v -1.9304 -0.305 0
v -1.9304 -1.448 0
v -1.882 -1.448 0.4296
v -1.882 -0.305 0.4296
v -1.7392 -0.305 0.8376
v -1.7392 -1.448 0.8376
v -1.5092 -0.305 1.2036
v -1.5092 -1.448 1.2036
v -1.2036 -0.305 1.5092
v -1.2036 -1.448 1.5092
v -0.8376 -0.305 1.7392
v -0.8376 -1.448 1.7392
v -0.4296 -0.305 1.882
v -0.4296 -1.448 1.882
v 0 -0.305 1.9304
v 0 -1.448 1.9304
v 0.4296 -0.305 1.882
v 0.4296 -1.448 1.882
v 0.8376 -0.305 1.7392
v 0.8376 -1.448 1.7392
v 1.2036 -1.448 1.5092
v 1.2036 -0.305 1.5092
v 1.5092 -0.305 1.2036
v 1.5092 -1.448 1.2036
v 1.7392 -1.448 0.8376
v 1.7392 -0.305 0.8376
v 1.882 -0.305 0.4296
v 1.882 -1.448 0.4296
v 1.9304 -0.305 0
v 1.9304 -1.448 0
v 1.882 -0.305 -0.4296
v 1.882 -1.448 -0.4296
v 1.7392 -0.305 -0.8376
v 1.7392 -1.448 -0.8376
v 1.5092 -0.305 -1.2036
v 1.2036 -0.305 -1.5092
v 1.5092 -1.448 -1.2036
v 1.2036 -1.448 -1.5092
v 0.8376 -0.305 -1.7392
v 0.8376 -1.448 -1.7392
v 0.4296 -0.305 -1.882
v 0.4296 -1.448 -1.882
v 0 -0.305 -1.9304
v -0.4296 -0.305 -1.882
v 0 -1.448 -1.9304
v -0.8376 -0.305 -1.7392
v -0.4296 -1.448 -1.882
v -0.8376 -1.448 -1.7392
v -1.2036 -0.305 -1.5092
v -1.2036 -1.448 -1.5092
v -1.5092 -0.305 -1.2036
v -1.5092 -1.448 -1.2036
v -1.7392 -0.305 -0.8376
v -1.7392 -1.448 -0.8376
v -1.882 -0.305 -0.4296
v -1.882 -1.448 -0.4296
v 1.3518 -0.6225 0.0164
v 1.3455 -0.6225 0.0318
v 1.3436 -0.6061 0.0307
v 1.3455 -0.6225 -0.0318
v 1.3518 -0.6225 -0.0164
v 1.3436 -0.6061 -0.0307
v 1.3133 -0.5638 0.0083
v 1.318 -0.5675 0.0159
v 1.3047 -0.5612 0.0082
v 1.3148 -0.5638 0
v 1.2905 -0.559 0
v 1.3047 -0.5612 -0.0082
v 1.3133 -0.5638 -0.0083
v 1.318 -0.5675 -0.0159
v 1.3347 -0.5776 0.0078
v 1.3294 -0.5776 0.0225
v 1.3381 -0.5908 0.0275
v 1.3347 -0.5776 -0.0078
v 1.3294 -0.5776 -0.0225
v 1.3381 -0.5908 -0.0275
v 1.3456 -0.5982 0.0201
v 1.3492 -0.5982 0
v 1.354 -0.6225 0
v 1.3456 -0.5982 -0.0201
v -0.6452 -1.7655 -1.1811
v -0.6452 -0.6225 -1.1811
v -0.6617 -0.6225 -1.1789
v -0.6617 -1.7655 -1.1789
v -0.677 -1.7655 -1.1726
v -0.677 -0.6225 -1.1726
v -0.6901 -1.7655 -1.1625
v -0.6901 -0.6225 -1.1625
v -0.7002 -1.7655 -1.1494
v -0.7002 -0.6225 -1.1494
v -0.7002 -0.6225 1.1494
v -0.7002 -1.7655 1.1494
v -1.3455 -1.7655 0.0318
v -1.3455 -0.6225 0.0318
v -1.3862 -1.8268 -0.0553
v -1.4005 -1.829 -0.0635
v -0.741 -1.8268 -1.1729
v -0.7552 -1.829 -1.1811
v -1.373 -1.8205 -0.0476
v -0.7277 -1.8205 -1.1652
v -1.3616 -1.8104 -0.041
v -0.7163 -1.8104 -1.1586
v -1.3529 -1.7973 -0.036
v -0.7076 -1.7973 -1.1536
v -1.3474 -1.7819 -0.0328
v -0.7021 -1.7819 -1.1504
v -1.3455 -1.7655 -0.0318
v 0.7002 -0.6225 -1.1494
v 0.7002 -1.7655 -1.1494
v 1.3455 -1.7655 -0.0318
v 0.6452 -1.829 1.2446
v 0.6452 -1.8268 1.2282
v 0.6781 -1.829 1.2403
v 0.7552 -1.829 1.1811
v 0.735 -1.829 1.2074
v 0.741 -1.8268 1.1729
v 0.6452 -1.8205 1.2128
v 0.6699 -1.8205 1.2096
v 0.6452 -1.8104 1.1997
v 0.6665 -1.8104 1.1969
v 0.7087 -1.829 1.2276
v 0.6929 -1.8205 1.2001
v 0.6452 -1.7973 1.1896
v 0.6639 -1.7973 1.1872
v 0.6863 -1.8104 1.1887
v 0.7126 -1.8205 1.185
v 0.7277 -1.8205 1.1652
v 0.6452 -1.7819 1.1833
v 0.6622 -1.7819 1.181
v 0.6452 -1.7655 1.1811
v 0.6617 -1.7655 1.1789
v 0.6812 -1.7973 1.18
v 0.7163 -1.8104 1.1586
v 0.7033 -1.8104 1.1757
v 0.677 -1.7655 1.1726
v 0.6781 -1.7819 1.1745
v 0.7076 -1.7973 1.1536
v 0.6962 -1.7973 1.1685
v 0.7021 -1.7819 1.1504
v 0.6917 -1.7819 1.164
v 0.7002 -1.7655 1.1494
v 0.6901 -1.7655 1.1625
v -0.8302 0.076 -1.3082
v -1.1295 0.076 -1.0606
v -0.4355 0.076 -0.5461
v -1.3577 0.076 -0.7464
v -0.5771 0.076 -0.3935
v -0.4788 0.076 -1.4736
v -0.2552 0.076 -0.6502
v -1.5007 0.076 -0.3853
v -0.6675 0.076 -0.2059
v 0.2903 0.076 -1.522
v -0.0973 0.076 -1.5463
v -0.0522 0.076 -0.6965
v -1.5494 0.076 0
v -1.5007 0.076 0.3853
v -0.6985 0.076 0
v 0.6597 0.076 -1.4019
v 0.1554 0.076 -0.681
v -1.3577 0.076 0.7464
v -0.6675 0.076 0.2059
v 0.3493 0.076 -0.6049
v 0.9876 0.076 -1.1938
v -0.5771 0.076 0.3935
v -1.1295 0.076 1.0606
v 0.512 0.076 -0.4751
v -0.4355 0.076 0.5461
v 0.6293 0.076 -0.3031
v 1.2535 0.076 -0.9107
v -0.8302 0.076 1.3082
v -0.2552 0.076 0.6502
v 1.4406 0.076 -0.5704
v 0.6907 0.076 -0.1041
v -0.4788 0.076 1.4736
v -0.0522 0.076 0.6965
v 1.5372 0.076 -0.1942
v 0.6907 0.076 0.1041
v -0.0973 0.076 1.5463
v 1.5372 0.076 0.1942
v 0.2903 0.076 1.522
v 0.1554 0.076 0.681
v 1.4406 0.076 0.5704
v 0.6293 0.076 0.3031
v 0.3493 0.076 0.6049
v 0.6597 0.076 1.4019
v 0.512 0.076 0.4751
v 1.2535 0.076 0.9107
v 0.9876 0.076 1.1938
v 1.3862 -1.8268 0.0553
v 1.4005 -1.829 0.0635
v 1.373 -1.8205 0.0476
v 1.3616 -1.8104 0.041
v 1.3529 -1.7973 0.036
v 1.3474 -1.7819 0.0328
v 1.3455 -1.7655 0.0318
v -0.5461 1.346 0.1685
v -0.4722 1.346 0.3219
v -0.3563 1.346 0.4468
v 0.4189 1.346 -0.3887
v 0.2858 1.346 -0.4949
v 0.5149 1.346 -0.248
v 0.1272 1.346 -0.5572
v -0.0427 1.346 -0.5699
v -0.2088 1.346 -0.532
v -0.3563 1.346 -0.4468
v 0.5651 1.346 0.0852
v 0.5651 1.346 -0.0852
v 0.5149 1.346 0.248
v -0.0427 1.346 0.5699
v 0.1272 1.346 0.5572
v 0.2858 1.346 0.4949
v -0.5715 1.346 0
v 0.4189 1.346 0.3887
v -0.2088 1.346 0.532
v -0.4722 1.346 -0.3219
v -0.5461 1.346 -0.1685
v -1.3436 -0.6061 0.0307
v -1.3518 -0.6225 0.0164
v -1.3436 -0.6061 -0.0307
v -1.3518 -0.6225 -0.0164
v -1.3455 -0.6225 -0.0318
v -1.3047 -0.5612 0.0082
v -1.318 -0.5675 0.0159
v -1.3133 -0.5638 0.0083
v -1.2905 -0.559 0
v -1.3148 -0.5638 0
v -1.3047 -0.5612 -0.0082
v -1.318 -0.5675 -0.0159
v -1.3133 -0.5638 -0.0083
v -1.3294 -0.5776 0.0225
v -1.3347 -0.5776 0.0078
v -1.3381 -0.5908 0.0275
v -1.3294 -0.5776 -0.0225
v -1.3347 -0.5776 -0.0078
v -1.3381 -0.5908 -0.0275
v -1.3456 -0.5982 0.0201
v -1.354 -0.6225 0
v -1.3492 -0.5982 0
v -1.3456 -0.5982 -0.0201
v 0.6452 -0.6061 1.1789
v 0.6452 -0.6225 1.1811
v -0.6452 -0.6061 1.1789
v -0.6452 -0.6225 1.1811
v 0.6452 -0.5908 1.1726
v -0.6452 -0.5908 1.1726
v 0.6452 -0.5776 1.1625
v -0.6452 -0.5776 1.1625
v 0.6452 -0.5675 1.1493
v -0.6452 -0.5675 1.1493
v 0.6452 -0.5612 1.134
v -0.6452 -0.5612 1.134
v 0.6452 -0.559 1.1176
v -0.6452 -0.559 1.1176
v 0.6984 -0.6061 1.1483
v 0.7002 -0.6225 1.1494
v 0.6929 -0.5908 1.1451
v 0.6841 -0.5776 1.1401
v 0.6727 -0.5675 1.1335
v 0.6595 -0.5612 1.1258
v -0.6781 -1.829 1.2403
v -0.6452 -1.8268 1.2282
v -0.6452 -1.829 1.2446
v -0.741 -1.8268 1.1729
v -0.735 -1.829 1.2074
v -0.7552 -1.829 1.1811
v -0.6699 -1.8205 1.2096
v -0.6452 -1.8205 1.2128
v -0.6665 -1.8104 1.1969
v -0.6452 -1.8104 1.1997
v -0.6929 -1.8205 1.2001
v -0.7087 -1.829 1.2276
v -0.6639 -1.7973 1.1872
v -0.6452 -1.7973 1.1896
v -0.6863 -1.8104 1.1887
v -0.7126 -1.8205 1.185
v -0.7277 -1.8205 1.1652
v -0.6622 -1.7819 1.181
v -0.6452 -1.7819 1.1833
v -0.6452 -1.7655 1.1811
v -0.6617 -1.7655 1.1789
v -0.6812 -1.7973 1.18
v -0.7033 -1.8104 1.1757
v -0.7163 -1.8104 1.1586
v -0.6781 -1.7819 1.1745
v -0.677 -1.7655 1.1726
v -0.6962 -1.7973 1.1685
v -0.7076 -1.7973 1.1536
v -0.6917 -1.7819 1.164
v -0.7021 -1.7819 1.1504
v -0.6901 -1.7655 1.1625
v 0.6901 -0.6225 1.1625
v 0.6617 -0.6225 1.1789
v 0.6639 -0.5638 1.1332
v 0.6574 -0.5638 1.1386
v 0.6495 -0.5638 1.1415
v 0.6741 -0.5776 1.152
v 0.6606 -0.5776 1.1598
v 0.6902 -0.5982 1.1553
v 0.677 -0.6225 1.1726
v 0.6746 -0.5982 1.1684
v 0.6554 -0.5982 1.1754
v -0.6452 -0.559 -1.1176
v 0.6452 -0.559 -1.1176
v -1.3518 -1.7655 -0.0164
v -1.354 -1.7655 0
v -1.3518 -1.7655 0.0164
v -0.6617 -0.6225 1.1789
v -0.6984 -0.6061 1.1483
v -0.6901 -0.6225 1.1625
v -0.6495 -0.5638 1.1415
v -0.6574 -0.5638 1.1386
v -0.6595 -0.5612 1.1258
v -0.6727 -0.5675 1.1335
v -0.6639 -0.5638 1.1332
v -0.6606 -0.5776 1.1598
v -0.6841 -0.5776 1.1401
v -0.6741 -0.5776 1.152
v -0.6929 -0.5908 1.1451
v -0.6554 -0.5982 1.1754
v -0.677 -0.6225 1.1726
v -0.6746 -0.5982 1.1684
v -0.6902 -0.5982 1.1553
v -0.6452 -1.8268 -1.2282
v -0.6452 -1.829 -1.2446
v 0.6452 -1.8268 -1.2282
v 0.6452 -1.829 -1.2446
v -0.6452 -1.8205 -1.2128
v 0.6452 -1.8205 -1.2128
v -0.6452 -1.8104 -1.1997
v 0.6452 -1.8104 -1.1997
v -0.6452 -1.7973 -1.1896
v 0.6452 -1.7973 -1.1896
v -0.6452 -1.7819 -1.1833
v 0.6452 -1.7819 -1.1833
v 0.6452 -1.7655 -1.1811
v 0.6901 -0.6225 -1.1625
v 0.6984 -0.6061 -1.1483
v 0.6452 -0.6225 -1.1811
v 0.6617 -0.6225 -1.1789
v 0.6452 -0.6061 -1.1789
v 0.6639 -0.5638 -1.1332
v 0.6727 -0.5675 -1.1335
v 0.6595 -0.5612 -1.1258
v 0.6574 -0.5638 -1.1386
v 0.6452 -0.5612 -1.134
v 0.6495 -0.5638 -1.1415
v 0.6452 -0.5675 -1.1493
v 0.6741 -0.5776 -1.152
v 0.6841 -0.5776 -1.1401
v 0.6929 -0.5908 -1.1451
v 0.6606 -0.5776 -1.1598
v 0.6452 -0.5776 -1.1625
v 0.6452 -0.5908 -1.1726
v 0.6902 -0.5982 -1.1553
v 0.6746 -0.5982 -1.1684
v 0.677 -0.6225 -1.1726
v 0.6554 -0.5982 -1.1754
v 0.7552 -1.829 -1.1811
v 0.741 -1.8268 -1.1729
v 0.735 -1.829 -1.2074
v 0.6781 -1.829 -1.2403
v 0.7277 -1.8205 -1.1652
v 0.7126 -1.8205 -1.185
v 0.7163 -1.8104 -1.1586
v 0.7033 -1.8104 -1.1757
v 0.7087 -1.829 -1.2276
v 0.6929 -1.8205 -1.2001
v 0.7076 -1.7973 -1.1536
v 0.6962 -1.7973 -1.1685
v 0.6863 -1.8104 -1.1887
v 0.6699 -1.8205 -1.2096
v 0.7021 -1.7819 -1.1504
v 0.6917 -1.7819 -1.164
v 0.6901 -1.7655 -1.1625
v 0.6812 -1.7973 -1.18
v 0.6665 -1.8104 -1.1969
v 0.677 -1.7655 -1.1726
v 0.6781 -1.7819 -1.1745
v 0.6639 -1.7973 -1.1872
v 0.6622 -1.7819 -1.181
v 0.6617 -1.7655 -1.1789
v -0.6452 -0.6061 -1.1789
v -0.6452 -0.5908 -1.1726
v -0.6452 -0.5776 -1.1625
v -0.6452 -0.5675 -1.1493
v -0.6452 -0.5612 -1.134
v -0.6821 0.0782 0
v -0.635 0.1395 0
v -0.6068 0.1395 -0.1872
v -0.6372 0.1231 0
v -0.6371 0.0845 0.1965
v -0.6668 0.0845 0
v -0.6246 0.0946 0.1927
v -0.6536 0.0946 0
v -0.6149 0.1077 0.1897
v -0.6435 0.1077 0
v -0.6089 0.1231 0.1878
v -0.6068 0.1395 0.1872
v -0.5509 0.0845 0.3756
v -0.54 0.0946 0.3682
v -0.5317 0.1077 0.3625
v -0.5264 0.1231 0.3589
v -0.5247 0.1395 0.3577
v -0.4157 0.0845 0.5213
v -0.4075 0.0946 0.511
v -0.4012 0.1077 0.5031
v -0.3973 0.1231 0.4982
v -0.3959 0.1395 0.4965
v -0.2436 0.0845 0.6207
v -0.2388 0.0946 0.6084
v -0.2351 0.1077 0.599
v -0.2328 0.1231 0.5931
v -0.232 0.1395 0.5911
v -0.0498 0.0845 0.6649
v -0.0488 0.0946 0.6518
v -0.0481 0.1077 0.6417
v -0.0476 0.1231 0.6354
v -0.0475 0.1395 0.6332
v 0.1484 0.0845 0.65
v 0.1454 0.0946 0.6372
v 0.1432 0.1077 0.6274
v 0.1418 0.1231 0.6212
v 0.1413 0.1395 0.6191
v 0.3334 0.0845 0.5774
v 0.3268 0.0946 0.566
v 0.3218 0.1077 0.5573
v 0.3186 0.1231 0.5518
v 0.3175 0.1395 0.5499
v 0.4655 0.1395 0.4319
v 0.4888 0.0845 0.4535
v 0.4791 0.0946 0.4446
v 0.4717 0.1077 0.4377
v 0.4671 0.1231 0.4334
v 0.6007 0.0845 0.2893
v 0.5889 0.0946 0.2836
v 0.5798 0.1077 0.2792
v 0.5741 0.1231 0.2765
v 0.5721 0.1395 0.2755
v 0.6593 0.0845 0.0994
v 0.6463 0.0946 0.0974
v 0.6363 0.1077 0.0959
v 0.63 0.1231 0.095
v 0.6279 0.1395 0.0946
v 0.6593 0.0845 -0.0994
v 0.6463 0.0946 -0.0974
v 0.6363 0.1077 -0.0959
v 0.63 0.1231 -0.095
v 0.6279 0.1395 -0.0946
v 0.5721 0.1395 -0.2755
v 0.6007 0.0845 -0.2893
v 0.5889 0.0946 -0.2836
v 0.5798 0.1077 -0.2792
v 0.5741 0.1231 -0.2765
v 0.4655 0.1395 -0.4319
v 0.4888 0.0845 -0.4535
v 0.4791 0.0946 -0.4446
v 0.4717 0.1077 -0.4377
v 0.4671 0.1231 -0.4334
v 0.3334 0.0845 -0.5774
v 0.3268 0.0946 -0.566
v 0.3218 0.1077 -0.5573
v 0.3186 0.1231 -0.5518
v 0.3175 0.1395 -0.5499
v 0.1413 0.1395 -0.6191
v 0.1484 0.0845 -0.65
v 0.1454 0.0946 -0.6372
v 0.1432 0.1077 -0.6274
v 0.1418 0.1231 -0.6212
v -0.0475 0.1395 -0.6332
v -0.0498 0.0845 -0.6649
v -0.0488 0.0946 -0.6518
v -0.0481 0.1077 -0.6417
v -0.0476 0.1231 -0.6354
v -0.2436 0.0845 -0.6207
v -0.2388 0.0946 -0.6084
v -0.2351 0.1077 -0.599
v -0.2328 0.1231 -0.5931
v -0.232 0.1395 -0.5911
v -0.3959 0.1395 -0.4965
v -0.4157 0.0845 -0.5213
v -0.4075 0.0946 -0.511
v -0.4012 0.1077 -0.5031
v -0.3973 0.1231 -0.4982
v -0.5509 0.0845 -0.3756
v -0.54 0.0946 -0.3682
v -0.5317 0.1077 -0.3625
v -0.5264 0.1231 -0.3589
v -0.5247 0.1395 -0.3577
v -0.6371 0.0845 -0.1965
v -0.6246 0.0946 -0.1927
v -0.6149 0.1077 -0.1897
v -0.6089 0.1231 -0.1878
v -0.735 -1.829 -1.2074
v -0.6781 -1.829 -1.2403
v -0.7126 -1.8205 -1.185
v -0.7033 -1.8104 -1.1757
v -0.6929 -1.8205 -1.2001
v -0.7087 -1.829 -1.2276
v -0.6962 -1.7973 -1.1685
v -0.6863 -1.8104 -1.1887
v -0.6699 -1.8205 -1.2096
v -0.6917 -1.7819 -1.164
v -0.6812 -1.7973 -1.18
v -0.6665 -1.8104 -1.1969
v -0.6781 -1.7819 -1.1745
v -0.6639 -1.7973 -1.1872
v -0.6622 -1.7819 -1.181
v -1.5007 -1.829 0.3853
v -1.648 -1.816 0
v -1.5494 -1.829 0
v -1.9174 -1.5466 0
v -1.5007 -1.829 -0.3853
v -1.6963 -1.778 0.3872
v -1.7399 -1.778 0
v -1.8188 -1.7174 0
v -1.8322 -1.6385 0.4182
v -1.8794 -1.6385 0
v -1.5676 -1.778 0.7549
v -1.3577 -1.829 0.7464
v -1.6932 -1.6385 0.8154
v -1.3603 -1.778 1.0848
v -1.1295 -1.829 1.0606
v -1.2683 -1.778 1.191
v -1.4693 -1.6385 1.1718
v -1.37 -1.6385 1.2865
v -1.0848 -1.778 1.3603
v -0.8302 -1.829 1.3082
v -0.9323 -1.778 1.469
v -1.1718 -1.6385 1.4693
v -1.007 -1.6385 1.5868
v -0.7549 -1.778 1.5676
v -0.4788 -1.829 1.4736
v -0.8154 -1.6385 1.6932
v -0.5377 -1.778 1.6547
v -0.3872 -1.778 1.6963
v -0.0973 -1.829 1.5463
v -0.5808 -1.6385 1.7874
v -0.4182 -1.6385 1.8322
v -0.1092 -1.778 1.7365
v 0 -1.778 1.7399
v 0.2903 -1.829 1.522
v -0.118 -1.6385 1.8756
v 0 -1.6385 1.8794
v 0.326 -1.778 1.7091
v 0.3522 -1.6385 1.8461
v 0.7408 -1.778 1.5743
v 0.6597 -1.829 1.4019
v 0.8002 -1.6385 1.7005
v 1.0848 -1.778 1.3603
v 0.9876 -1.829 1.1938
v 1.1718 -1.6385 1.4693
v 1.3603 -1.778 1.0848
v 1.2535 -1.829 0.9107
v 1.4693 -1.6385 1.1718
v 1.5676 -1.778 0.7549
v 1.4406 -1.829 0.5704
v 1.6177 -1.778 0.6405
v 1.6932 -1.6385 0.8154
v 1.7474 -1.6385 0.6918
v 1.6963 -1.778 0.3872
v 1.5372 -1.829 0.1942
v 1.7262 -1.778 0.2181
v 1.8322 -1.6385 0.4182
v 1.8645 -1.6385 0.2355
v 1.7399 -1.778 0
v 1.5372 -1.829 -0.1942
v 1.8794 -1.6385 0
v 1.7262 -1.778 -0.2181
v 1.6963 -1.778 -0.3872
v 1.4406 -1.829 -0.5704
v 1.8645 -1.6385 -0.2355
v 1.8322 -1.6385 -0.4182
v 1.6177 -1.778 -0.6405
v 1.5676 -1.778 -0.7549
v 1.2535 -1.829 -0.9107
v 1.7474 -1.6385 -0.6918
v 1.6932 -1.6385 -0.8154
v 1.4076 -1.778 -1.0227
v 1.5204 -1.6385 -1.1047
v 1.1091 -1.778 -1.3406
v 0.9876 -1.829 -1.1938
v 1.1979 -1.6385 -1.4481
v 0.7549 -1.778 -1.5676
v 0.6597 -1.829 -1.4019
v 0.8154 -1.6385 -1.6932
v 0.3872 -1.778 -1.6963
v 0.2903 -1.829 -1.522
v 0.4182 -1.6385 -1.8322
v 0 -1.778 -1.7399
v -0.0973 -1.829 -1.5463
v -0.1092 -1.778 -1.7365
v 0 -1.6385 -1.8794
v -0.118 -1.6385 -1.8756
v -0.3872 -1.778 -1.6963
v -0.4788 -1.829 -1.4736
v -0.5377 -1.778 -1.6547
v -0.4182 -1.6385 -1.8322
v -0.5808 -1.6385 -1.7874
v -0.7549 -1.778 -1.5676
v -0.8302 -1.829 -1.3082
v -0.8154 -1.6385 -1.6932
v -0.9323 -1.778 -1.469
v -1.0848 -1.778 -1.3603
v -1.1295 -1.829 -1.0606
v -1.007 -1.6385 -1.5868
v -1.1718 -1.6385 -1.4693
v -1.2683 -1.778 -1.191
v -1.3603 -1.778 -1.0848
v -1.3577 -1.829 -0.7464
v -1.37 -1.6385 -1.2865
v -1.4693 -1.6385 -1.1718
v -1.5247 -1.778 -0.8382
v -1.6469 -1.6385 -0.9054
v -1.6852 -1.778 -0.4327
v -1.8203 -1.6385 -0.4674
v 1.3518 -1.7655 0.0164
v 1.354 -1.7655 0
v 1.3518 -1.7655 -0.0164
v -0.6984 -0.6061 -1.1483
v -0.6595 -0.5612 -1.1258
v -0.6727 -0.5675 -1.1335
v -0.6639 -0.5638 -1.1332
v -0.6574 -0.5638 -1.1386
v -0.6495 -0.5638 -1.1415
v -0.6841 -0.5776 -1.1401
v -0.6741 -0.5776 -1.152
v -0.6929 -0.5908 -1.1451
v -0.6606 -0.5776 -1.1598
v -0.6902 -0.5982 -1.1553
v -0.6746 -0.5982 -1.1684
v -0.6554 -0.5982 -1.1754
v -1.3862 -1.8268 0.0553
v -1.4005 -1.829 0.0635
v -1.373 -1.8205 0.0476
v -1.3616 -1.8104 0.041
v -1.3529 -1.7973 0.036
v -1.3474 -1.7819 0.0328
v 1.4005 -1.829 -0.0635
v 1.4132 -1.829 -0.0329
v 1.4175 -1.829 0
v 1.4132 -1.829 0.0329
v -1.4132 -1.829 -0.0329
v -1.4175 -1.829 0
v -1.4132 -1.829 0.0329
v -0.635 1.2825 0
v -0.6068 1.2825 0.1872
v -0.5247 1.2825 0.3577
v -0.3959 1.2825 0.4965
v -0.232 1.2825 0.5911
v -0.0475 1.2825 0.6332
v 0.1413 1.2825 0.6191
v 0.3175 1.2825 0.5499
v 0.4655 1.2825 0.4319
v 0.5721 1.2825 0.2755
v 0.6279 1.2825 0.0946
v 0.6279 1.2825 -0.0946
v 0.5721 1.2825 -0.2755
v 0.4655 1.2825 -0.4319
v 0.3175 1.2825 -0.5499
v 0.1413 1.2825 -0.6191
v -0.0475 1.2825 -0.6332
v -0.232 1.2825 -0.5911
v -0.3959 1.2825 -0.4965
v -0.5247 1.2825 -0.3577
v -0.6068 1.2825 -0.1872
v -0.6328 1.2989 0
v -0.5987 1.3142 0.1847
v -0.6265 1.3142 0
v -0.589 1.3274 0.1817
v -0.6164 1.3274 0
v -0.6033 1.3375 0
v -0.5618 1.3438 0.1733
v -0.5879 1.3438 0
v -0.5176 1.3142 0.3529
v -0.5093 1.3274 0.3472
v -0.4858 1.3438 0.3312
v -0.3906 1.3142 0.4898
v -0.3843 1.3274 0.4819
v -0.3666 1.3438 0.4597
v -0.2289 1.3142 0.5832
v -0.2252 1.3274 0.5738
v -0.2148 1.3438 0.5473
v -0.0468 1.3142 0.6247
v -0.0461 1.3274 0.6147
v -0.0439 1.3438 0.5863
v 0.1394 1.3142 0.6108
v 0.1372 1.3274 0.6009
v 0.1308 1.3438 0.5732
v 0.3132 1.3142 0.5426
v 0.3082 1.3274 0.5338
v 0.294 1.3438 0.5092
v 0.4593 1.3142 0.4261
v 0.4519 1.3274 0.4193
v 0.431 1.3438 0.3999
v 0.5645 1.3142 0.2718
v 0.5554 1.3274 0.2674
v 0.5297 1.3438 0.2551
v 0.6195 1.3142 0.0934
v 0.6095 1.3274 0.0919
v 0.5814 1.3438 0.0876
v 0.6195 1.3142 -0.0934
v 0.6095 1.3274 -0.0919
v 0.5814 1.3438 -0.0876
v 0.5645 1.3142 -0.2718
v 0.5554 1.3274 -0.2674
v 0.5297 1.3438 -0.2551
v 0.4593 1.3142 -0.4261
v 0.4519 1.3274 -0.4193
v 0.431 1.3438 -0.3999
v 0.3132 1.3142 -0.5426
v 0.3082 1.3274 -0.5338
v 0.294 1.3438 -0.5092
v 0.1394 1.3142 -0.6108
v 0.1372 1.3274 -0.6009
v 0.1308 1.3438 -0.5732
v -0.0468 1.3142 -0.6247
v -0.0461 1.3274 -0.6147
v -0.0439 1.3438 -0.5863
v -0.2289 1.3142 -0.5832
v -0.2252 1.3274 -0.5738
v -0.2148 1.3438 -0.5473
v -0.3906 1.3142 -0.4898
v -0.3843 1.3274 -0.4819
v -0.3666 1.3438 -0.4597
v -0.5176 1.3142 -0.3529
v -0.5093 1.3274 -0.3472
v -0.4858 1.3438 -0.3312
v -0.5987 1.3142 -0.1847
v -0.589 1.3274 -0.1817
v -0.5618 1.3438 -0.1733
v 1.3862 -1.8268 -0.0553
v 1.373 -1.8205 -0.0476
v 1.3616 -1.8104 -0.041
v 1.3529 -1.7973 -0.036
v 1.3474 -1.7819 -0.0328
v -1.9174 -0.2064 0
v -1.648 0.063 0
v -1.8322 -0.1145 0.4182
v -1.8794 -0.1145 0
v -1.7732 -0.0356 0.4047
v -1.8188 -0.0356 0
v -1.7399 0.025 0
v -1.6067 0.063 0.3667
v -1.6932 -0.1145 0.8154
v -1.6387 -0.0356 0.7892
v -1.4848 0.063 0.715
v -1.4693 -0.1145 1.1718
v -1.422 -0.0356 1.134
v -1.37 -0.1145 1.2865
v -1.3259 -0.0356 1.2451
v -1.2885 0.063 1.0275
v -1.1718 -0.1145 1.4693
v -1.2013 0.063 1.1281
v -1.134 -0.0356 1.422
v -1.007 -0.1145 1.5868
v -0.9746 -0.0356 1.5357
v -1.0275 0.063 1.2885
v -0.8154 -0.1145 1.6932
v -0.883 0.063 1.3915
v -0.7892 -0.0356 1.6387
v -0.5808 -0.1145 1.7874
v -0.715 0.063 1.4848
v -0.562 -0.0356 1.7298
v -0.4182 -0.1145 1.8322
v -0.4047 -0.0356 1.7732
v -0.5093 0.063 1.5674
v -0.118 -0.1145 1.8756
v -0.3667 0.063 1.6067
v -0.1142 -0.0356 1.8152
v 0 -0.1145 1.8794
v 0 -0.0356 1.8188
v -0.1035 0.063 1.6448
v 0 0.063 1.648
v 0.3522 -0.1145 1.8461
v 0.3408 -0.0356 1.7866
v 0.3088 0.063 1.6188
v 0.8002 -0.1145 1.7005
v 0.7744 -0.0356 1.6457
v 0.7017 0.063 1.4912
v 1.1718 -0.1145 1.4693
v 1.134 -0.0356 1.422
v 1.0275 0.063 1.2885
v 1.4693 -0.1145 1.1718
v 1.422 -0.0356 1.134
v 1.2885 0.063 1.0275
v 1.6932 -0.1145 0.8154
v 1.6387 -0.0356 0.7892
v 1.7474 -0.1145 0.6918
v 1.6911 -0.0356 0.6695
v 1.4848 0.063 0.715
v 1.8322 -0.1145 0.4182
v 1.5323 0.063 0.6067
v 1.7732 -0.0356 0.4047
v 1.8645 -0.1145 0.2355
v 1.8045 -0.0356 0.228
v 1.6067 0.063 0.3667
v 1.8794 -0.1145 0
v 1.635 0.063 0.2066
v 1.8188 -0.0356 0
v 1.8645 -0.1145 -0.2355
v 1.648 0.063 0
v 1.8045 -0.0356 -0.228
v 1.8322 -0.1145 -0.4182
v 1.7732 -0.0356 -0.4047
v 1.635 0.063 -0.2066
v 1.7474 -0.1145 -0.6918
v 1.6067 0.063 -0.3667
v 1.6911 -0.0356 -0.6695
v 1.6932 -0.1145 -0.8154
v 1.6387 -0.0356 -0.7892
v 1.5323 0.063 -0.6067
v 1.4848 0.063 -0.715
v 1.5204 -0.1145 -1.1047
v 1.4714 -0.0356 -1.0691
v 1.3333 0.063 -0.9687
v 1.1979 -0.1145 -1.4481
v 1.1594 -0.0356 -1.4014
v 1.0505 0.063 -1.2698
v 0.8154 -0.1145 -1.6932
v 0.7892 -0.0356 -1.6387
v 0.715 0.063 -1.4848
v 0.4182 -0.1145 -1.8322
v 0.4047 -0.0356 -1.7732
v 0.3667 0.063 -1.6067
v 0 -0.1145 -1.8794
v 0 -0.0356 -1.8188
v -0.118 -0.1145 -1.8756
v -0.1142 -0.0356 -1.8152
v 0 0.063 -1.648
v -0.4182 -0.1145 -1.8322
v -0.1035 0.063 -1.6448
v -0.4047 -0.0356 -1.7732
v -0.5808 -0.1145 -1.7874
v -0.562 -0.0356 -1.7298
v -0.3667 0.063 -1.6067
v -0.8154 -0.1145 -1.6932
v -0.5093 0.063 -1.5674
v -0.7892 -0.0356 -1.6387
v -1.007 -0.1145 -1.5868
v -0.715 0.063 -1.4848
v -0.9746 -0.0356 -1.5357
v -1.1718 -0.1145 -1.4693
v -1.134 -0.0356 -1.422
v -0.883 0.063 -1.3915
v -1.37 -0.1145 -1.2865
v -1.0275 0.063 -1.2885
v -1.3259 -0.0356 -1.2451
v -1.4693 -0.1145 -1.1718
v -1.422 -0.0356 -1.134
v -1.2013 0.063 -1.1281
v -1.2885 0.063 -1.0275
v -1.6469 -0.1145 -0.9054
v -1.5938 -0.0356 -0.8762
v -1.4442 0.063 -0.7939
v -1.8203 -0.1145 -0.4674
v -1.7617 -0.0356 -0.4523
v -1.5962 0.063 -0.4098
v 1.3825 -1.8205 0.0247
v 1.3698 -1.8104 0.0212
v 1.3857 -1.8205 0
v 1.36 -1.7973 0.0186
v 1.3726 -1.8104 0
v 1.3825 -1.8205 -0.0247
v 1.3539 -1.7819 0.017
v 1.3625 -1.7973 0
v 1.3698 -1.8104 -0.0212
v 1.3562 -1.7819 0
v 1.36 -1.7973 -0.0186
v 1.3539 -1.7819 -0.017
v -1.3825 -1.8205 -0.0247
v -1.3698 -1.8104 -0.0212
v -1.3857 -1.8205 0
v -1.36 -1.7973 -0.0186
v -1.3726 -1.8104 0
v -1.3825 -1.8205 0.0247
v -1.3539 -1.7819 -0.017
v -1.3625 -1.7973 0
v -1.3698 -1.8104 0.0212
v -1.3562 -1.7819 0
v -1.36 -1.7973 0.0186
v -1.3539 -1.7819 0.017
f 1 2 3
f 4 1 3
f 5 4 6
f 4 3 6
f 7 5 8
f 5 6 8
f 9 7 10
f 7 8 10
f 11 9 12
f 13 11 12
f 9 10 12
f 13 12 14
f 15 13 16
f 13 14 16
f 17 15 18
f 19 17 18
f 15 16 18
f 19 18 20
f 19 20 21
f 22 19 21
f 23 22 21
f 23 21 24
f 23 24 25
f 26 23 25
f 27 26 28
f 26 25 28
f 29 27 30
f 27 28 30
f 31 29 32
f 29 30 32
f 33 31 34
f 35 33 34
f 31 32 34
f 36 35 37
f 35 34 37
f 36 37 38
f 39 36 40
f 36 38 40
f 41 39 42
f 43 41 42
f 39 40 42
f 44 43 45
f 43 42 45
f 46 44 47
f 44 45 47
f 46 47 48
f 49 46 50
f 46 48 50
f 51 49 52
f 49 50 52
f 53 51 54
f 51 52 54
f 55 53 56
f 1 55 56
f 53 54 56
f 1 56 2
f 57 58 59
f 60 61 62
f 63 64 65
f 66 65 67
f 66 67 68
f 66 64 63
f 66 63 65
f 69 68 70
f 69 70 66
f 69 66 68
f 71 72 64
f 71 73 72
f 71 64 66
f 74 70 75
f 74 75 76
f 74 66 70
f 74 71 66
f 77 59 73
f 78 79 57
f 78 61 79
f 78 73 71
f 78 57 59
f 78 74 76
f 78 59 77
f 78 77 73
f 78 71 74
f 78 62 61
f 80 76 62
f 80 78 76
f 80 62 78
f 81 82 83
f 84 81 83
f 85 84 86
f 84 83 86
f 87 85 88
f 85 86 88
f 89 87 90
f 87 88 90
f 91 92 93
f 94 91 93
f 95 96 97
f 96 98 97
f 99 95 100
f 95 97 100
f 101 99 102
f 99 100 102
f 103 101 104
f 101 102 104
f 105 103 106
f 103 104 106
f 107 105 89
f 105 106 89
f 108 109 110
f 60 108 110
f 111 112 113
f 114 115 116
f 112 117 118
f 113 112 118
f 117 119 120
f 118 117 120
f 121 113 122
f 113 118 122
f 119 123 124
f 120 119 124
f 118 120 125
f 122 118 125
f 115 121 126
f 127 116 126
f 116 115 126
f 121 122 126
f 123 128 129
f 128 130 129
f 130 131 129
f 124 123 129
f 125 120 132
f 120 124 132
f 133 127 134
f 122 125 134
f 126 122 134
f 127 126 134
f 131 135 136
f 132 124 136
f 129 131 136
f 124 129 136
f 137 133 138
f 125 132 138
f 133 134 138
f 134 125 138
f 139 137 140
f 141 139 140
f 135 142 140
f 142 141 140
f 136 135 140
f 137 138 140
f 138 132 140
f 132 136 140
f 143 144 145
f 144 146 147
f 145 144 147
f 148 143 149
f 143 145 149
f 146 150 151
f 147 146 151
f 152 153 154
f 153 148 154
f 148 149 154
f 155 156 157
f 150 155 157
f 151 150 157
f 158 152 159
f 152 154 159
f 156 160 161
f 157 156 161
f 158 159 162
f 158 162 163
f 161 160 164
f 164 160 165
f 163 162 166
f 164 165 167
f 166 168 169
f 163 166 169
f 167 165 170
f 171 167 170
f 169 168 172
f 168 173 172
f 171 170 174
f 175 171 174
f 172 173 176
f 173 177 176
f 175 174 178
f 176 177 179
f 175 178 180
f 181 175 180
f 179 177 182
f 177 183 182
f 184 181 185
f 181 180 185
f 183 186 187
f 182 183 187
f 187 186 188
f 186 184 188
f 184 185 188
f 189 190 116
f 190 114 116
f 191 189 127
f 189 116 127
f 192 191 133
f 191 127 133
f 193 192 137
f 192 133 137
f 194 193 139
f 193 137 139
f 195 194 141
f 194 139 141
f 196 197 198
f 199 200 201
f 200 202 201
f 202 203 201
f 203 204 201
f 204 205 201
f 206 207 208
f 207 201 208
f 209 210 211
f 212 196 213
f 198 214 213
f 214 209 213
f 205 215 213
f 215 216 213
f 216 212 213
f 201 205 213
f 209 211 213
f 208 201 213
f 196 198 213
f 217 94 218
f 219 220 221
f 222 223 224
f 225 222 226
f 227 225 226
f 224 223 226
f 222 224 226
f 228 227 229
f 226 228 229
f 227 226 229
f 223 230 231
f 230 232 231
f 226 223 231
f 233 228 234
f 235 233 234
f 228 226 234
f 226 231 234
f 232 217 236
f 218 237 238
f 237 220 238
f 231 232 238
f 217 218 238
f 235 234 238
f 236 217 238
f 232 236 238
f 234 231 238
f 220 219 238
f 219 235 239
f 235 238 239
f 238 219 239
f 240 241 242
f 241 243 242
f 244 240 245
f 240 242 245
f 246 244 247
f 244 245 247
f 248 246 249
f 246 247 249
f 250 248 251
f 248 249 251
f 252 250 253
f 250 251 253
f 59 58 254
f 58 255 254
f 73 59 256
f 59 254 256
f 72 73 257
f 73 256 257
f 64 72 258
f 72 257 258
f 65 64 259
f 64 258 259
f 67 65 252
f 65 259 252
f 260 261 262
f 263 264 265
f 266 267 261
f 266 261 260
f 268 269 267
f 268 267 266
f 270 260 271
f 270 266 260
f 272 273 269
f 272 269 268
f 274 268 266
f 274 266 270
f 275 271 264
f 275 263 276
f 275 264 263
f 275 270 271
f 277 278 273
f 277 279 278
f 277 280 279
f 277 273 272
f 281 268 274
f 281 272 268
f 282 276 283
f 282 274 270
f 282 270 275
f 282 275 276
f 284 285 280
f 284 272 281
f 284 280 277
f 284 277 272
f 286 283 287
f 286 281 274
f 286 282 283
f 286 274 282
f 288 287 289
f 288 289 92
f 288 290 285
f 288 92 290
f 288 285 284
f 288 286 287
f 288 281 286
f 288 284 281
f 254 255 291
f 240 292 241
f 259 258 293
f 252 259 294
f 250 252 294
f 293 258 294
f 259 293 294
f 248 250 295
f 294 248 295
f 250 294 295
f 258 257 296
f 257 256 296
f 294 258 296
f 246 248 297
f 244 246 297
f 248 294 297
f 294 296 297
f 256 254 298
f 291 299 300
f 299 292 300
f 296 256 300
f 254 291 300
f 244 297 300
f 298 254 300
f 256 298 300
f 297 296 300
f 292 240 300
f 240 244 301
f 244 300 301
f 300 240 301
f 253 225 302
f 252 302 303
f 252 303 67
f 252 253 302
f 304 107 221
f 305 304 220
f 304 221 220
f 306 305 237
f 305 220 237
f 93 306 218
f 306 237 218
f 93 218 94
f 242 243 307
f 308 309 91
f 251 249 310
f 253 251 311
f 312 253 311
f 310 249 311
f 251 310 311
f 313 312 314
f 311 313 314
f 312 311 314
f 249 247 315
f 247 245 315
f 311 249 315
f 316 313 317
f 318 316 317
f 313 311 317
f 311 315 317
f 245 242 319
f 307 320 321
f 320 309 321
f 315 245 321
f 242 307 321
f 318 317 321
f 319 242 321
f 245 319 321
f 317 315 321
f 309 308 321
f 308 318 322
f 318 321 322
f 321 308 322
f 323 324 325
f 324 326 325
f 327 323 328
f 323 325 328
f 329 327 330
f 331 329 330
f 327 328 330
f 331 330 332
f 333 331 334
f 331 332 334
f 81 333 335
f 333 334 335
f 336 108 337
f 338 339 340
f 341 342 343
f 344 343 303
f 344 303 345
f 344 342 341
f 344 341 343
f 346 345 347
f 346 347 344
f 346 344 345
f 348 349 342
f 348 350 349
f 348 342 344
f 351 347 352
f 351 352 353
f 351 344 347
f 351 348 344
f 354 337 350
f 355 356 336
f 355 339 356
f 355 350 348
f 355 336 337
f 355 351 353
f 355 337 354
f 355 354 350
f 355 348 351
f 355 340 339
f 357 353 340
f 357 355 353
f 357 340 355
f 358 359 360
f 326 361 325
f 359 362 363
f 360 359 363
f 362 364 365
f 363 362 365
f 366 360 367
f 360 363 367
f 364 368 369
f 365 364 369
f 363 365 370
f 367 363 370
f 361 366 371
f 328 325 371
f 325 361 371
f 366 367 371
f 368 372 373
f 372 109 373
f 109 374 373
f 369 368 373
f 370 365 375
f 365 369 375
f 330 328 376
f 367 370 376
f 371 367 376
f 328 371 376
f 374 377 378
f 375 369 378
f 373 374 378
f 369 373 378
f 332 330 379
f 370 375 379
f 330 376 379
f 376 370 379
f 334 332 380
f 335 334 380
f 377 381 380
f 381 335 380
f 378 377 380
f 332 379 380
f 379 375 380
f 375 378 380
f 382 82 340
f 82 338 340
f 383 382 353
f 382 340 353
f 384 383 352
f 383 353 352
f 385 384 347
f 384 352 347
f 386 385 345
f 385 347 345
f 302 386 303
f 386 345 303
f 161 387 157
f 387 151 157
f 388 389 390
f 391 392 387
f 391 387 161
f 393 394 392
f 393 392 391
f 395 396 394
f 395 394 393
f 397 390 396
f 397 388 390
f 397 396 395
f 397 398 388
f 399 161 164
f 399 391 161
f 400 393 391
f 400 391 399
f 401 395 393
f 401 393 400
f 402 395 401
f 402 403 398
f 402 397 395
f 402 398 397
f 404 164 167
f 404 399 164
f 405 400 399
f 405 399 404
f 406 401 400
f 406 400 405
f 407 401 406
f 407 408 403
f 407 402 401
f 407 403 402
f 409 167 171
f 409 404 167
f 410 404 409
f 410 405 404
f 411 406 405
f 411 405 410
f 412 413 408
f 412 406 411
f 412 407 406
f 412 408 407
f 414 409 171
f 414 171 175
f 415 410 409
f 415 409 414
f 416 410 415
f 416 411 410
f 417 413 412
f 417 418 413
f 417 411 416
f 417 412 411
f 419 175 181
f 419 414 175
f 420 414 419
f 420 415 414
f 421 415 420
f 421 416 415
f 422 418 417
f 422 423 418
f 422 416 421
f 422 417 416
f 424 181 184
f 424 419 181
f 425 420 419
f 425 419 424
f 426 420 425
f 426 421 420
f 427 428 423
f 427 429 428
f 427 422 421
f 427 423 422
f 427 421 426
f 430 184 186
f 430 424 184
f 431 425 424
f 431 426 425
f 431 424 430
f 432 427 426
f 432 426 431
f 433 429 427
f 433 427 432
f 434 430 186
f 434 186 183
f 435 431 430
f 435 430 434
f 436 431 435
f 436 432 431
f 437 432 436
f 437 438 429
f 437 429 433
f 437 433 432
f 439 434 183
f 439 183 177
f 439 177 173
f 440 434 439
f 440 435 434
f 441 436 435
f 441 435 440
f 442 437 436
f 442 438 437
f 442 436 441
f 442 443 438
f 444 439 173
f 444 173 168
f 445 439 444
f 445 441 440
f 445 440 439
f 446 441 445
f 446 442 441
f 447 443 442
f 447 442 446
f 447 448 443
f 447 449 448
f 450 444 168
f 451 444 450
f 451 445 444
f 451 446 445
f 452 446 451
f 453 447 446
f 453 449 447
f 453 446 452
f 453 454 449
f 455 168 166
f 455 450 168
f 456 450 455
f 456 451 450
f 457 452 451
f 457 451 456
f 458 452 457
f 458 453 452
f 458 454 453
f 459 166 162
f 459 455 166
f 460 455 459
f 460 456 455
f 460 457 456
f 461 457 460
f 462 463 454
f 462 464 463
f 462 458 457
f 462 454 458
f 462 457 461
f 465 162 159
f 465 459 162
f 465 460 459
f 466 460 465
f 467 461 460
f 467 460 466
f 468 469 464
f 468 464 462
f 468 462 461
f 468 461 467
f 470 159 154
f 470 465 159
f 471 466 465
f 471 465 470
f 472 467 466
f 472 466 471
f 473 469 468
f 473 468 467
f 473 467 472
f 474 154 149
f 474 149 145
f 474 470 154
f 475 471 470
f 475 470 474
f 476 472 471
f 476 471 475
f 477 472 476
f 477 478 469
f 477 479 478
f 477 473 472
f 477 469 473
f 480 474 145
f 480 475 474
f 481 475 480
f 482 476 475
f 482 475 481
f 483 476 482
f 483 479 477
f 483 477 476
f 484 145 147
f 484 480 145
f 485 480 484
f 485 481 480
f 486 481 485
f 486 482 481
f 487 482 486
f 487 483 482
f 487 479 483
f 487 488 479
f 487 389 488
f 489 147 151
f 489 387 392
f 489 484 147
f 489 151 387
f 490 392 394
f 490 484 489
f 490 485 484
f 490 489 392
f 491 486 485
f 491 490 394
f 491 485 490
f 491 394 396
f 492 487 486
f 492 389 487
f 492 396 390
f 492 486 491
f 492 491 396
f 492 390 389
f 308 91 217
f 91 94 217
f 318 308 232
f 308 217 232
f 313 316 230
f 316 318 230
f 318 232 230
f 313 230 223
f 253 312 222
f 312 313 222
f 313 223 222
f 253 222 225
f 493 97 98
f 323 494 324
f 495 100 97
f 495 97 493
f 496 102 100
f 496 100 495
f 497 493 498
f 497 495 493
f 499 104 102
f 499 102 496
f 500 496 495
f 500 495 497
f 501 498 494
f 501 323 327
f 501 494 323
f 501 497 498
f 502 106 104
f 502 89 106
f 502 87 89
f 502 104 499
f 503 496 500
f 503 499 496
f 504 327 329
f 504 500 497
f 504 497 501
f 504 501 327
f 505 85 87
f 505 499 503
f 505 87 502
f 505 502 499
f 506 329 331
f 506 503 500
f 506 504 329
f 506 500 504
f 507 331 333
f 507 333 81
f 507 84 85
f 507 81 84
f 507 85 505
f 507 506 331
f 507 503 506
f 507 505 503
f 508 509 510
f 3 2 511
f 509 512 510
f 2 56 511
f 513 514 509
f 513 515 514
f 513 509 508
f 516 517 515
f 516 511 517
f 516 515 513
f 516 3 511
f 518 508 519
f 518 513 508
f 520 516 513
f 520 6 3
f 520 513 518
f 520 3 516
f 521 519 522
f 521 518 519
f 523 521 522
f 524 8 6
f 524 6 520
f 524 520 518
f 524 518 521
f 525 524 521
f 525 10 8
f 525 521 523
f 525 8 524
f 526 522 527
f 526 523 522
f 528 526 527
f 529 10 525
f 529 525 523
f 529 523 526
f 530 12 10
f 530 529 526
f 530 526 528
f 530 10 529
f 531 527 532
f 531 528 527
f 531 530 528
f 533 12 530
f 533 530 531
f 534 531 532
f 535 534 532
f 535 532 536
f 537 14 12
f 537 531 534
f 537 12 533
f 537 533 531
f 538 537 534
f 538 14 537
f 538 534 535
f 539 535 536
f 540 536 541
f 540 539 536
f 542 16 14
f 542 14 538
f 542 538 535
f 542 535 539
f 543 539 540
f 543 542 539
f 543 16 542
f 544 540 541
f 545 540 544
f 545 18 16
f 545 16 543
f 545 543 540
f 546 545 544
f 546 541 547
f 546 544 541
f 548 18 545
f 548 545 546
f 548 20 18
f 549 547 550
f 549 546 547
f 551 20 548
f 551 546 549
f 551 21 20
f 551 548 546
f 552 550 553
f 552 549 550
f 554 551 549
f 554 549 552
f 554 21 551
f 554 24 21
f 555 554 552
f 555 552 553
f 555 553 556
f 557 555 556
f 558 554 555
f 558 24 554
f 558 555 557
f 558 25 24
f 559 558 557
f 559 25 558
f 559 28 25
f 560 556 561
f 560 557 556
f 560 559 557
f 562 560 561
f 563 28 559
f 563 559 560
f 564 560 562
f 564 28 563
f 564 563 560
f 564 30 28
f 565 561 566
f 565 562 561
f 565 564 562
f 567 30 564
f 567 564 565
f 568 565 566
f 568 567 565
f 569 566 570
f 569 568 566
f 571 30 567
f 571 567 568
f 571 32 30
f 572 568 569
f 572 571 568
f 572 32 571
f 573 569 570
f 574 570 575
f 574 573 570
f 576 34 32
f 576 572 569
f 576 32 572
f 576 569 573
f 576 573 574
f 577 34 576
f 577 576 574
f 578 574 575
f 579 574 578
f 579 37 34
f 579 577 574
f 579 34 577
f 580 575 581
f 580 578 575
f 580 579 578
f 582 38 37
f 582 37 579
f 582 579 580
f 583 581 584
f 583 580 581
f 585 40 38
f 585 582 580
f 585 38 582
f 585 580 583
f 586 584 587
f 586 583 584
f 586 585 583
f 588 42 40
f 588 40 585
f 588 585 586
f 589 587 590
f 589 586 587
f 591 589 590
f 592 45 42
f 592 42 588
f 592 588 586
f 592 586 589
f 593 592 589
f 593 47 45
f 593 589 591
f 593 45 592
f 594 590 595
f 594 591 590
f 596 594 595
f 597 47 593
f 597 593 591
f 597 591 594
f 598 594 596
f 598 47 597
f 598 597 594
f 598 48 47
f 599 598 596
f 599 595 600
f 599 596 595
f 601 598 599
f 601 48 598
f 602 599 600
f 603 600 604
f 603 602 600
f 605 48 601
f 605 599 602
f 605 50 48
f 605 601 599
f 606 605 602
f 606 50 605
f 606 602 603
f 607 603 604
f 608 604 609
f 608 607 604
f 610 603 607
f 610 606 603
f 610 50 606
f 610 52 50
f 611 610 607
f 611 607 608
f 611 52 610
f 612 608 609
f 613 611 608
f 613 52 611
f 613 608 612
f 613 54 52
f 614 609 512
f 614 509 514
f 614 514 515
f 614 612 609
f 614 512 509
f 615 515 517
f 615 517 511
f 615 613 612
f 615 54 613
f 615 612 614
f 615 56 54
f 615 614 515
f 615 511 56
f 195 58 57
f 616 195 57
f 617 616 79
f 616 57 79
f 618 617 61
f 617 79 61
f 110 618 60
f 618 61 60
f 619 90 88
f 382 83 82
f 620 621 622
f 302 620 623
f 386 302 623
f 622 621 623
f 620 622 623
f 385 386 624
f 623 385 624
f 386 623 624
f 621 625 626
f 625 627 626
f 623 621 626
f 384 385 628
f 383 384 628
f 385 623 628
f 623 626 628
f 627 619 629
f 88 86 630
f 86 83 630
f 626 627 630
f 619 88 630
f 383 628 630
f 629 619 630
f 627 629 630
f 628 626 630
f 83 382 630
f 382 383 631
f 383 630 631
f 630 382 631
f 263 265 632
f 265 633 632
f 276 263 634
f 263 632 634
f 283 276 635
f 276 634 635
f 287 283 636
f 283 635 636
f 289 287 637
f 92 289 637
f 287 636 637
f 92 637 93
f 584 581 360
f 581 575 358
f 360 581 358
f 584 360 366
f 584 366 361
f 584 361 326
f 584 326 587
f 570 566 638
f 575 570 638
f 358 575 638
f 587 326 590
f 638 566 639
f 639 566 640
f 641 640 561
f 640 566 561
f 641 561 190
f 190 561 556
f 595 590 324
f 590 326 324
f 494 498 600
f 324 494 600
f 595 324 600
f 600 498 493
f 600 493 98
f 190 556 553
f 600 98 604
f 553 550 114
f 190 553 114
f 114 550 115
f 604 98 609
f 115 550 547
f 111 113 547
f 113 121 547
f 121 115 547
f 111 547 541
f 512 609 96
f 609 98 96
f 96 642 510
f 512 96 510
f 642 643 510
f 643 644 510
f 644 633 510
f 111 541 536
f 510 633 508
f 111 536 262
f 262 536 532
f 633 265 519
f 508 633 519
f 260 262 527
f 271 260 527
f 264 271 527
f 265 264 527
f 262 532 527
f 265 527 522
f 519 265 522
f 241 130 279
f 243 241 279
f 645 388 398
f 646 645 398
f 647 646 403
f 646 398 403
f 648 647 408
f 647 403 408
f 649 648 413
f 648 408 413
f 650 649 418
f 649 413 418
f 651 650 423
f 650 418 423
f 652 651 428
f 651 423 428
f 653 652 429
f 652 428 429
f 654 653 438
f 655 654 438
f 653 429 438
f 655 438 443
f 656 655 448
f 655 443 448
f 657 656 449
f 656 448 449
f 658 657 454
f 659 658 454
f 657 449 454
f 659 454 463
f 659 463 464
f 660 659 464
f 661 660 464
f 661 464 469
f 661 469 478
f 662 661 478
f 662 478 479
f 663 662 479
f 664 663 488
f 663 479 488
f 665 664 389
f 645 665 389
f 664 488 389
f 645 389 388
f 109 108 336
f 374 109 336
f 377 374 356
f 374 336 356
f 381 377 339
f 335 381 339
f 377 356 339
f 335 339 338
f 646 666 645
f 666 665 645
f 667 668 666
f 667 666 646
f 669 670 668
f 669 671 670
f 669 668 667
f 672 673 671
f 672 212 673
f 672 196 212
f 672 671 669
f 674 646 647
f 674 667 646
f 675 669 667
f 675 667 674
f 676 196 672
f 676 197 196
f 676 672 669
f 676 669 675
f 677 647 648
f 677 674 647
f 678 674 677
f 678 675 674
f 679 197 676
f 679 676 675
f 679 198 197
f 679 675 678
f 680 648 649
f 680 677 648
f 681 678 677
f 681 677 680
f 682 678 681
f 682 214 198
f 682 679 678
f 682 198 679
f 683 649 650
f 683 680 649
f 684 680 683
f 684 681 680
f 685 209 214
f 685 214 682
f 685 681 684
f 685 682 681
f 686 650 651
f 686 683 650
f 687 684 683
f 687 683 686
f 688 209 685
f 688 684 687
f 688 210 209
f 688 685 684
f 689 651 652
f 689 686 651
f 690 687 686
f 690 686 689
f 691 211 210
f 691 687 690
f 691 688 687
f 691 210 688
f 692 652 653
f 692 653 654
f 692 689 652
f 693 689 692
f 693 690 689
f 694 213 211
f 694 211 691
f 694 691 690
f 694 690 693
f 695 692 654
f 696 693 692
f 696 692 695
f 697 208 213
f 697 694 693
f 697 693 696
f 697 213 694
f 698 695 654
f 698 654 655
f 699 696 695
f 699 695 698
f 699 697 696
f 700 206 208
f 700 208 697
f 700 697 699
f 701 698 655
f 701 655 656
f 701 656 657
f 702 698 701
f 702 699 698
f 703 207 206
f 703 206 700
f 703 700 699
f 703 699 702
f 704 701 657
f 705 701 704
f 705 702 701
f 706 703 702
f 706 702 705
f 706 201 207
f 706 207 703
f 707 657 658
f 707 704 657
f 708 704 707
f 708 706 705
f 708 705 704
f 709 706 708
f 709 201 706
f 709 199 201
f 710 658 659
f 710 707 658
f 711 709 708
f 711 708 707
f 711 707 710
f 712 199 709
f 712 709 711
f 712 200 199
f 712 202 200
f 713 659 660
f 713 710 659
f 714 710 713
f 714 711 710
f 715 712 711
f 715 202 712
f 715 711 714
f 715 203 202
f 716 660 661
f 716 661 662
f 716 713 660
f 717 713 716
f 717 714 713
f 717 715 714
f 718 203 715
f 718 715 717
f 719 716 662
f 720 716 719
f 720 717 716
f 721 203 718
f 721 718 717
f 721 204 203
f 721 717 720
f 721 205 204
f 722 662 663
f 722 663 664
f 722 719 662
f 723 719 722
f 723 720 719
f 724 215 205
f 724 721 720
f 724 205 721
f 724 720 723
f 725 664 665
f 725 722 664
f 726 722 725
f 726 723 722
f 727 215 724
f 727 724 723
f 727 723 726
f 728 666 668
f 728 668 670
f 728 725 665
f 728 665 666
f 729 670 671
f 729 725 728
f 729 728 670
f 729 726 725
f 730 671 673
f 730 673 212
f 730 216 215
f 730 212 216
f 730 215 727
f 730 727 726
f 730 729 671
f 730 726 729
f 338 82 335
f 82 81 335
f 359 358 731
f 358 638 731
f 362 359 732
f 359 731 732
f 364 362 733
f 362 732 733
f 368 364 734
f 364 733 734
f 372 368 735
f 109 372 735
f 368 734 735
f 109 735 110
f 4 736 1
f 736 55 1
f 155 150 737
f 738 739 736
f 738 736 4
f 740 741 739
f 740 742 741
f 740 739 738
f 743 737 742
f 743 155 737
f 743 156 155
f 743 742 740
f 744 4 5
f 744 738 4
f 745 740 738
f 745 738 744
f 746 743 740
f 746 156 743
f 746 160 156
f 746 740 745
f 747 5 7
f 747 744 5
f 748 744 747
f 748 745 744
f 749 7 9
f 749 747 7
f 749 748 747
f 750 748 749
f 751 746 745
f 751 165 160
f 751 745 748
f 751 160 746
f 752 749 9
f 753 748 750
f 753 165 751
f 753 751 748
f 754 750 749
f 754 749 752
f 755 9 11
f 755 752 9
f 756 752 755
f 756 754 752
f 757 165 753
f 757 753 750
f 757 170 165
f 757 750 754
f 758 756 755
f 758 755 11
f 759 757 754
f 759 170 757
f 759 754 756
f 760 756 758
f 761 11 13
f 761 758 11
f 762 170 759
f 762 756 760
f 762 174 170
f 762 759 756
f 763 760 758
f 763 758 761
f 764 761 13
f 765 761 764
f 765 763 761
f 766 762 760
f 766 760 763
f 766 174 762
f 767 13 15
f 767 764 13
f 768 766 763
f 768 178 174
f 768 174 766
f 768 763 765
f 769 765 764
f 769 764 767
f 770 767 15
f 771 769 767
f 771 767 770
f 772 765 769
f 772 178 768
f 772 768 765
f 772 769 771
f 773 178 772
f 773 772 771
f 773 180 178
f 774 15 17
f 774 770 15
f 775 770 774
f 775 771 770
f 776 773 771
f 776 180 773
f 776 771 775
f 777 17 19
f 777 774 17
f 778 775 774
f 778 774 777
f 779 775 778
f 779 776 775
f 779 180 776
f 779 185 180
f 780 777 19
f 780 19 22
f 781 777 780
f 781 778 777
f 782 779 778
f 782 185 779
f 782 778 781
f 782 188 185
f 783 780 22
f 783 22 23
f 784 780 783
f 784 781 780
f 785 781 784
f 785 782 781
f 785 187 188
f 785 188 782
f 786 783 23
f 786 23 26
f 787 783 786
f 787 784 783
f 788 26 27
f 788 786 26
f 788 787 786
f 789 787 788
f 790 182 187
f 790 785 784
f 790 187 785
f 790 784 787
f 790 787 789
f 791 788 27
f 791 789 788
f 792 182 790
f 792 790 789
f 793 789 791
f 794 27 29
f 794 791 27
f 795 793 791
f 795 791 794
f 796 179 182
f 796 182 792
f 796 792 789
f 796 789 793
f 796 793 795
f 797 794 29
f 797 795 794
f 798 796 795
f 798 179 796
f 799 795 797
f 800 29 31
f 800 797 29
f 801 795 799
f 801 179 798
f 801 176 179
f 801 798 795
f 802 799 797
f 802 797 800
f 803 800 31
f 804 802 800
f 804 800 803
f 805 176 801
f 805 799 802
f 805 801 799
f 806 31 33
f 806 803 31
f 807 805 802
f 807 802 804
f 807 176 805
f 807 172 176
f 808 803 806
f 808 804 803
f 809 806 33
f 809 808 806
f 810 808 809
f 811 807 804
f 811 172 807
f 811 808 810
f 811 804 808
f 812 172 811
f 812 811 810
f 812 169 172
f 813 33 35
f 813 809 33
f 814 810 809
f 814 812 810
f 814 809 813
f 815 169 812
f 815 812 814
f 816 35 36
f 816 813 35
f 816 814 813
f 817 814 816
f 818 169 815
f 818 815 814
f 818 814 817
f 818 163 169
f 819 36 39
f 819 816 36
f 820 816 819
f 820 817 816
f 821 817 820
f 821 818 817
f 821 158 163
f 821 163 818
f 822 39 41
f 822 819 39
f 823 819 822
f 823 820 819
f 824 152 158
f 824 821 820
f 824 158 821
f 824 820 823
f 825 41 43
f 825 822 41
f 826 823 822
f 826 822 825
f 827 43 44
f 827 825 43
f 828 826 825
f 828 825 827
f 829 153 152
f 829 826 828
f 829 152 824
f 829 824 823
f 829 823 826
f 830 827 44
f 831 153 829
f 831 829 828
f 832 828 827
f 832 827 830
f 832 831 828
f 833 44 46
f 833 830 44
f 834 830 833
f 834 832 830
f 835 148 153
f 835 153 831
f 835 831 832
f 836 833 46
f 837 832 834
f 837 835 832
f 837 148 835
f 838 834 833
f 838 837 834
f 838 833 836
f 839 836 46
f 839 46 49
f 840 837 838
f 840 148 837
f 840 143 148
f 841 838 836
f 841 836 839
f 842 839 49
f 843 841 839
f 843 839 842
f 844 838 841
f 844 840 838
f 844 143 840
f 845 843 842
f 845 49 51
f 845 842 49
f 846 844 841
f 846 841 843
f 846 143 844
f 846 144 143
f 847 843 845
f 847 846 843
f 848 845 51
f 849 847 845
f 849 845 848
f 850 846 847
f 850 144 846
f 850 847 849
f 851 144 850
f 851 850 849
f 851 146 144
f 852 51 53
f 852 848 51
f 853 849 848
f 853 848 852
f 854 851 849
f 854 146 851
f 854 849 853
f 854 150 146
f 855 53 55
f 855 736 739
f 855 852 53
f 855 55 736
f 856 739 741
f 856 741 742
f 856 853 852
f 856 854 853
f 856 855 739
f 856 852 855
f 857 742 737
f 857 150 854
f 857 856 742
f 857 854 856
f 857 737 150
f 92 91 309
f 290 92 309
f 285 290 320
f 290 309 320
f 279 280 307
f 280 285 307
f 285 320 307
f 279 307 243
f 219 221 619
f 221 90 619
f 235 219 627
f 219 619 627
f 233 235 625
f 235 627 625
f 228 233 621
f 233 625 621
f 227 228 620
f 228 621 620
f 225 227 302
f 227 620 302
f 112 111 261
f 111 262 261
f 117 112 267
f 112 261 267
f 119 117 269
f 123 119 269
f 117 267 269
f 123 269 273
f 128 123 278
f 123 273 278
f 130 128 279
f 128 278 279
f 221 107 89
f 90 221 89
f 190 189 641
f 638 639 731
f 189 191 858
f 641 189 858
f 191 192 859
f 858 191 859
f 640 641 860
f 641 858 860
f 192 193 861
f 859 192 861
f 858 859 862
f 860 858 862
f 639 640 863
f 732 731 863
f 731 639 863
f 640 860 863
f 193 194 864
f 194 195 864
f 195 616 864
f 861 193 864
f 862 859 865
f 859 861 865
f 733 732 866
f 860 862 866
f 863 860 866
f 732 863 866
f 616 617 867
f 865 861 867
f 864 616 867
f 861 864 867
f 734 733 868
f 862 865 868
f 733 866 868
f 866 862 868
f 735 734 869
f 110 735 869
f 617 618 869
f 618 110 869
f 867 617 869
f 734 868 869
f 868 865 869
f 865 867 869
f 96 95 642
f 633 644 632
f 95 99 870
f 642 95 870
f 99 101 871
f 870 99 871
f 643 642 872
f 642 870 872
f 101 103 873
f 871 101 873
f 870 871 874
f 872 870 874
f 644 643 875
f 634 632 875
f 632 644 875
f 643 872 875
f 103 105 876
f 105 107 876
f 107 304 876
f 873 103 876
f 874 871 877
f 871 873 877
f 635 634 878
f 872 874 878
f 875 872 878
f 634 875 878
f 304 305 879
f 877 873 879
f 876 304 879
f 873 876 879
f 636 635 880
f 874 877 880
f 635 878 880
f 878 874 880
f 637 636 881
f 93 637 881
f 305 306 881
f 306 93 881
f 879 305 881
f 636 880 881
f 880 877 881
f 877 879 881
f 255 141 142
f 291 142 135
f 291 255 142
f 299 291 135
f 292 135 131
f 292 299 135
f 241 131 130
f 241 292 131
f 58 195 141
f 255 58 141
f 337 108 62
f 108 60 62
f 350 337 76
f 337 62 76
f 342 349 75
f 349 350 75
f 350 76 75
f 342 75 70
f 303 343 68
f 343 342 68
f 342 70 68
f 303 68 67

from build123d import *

# Parameters (mm, degrees)
F3_DEPTH = 1.27
F4_R     = 0.381
F5_R     = 0.0635


with BuildPart() as f1:
    # F0 (on Top) → F1 (revolve)
    with BuildSketch(Plane.XY):
        Polygon((-1.9304, -1.829002), (0, -1.829002), (0, 1.345998), (-0.635, 1.345998), (-0.635, 0.075998), (-1.9304, 0.075998), align=None)
    revolve(axis=Axis((0, -0.241502, 0), (0, 1, 0)))

    # F2 (on face) → F3 (cut)
    with BuildSketch(Plane.XZ.offset(1.829002)):
        Polygon((0.681908, 1.1811), (-0.681908, 1.1811), (-1.363817, 0), (-0.681908, -1.1811), (0.681908, -1.1811), (1.363817, 0), align=None)
    extrude(amount=-F3_DEPTH, mode=Mode.SUBTRACT)

    # F4
    f4_edges = [f1.edges().sort_by_distance(p)[0] for p in [
        (1.9304, -1.829002, 0),
        (1.9304, 0.075998, 0),
    ]]
    fillet(f4_edges, radius=F4_R)

    # F5
    f5_edges = [f1.edges().sort_by_distance(p)[0] for p in [
        (0, -1.829002, 1.1811),
        (1.022863, -1.829002, 0.59055),
        (1.022863, -1.829002, -0.59055),
        (-1.022863, -1.829002, -0.59055),
        (-1.022863, -1.829002, 0.59055),
        (1.022863, -0.559002, 0.59055),
        (1.022863, -0.559002, -0.59055),
        (0, -0.559002, 1.1811),
        (-1.022863, -0.559002, 0.59055),
        (-1.022863, -0.559002, -0.59055),
        (0, -0.559002, -1.1811),
        (0, -1.829002, -1.1811),
        (0.681908, -1.194002, 1.1811),
        (-0.681908, -1.194002, 1.1811),
        (-1.363817, -1.194002, 0),
        (-0.681908, -1.194002, -1.1811),
        (0.681908, -1.194002, -1.1811),
        (1.363817, -1.194002, 0),
        (0.635, 0.075998, 0),
        (0.635, 1.345998, 0),
    ]]
    fillet(f5_edges, radius=F5_R)


solid = f1.part
